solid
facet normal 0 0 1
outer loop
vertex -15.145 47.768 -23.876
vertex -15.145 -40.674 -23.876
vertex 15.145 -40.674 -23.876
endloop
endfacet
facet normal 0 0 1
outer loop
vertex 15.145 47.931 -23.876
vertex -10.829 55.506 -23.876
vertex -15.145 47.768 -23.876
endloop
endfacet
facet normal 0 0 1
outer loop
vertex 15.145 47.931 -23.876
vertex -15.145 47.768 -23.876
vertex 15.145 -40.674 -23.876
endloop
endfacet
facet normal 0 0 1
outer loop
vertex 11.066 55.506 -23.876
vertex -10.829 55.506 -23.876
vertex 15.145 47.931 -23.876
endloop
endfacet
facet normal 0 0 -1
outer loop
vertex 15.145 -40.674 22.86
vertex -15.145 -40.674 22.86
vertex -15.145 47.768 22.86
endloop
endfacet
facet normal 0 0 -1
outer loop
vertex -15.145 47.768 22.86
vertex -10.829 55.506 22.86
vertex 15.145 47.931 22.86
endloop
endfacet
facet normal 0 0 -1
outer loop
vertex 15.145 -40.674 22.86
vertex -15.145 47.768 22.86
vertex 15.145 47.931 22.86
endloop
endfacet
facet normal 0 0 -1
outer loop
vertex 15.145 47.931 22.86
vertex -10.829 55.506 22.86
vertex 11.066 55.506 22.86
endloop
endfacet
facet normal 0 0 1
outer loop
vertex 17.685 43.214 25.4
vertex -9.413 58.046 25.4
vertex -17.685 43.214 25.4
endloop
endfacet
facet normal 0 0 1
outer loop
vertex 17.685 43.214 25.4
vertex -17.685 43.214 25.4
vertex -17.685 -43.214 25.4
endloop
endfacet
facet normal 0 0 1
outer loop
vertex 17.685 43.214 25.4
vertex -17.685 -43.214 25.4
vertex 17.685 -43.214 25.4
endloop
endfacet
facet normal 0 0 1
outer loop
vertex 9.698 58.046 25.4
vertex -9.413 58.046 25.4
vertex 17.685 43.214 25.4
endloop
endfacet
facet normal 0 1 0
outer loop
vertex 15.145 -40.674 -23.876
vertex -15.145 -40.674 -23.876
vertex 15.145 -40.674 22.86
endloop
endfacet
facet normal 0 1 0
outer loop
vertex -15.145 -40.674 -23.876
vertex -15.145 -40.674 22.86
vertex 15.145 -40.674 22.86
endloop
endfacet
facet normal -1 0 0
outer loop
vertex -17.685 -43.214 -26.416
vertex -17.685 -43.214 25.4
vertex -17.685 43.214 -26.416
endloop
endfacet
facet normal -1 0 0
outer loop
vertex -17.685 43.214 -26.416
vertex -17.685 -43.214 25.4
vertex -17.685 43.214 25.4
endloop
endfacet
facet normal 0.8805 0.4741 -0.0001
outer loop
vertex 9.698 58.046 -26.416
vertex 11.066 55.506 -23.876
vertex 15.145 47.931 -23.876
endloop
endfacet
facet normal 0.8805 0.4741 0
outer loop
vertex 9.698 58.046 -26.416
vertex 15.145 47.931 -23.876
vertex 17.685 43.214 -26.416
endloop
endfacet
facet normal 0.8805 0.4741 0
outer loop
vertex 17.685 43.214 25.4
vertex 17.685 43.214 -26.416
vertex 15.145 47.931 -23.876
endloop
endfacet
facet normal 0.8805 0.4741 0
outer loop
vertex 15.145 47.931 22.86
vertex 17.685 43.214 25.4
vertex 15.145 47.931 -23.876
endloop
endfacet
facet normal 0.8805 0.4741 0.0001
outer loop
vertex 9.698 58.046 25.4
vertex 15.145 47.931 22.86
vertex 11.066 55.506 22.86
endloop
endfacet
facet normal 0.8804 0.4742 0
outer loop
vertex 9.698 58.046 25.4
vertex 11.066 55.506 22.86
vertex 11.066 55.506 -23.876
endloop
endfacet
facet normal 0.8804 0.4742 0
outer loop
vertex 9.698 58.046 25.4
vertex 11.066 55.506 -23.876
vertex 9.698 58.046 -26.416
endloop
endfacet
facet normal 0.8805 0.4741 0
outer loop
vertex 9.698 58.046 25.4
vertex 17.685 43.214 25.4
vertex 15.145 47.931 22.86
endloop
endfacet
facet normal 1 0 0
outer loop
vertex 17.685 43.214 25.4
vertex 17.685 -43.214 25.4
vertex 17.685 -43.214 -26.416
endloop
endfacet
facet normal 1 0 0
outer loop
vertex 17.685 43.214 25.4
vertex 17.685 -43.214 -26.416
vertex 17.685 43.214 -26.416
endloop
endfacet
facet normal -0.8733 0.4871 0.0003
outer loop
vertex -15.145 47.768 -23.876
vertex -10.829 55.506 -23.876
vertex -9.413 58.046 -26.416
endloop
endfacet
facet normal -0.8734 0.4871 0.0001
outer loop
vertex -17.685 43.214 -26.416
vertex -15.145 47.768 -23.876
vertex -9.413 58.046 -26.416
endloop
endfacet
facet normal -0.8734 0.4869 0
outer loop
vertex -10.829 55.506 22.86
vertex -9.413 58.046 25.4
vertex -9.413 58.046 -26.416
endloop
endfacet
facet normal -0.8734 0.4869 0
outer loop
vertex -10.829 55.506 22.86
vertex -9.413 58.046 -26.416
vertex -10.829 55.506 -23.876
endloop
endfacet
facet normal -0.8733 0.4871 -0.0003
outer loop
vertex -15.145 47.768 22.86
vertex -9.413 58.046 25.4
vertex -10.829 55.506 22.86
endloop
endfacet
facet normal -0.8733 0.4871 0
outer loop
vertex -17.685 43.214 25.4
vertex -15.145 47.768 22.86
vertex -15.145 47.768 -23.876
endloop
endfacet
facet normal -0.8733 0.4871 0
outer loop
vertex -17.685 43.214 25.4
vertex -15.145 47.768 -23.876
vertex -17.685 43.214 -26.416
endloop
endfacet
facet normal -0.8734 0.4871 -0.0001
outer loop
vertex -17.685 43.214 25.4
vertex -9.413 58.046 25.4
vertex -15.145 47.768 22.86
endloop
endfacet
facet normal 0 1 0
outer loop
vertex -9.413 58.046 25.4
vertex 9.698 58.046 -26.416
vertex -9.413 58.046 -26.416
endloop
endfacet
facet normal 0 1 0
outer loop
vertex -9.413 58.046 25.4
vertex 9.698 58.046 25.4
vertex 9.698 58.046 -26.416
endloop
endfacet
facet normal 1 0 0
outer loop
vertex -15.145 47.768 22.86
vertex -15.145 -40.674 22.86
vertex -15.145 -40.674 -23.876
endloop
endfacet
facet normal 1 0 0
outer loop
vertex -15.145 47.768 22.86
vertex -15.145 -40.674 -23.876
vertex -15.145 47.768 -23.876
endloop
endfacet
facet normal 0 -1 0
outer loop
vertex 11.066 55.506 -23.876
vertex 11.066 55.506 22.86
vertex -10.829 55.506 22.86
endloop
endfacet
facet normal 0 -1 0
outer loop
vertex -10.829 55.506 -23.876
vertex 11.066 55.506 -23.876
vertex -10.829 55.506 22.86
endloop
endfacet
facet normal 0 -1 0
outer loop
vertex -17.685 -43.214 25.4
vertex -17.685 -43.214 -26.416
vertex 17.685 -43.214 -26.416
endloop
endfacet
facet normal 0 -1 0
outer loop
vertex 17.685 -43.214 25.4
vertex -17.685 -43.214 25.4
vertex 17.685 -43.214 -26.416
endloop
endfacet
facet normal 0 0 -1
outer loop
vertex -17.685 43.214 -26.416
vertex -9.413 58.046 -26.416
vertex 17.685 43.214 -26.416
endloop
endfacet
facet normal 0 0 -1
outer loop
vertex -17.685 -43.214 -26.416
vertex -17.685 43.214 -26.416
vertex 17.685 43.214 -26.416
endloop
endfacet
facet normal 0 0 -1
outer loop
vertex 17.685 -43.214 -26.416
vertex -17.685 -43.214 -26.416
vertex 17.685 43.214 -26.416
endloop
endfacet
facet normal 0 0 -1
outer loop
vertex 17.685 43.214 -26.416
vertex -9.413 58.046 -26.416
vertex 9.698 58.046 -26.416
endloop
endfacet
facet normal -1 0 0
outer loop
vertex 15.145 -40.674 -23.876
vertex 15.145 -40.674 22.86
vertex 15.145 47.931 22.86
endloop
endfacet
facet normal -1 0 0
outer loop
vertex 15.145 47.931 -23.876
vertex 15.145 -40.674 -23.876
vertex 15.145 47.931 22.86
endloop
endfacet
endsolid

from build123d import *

# Parameters (mm, degrees)
F0_W          = 35.36984
F0_H          = 86.427912
F1_DEPTH      = 25.4
F1_DEPTH_BACK = 26.416
F2_T          = -2.54


with BuildPart() as f1:
    # F0 (on Top) → F1 (new body, two sides)
    with BuildSketch(Plane.XY) as f1_sk:
        Polygon((-9.412942, 58.046471), (-17.68492, 43.213956), (17.68492, 43.213956), (9.698181, 58.046471), align=None)
        Rectangle(F0_W, F0_H)
    extrude(amount=F1_DEPTH)
    extrude(f1_sk.sketch, amount=-F1_DEPTH_BACK)

    # F2
    f2_openings = [f1.faces().sort_by_distance(p)[0] for p in [
        (-13.548931, 50.630214, -0.508),
        (13.691551, 50.630214, -0.508),
    ]]
    offset(amount=F2_T, openings=f2_openings)


solid = f1.part
